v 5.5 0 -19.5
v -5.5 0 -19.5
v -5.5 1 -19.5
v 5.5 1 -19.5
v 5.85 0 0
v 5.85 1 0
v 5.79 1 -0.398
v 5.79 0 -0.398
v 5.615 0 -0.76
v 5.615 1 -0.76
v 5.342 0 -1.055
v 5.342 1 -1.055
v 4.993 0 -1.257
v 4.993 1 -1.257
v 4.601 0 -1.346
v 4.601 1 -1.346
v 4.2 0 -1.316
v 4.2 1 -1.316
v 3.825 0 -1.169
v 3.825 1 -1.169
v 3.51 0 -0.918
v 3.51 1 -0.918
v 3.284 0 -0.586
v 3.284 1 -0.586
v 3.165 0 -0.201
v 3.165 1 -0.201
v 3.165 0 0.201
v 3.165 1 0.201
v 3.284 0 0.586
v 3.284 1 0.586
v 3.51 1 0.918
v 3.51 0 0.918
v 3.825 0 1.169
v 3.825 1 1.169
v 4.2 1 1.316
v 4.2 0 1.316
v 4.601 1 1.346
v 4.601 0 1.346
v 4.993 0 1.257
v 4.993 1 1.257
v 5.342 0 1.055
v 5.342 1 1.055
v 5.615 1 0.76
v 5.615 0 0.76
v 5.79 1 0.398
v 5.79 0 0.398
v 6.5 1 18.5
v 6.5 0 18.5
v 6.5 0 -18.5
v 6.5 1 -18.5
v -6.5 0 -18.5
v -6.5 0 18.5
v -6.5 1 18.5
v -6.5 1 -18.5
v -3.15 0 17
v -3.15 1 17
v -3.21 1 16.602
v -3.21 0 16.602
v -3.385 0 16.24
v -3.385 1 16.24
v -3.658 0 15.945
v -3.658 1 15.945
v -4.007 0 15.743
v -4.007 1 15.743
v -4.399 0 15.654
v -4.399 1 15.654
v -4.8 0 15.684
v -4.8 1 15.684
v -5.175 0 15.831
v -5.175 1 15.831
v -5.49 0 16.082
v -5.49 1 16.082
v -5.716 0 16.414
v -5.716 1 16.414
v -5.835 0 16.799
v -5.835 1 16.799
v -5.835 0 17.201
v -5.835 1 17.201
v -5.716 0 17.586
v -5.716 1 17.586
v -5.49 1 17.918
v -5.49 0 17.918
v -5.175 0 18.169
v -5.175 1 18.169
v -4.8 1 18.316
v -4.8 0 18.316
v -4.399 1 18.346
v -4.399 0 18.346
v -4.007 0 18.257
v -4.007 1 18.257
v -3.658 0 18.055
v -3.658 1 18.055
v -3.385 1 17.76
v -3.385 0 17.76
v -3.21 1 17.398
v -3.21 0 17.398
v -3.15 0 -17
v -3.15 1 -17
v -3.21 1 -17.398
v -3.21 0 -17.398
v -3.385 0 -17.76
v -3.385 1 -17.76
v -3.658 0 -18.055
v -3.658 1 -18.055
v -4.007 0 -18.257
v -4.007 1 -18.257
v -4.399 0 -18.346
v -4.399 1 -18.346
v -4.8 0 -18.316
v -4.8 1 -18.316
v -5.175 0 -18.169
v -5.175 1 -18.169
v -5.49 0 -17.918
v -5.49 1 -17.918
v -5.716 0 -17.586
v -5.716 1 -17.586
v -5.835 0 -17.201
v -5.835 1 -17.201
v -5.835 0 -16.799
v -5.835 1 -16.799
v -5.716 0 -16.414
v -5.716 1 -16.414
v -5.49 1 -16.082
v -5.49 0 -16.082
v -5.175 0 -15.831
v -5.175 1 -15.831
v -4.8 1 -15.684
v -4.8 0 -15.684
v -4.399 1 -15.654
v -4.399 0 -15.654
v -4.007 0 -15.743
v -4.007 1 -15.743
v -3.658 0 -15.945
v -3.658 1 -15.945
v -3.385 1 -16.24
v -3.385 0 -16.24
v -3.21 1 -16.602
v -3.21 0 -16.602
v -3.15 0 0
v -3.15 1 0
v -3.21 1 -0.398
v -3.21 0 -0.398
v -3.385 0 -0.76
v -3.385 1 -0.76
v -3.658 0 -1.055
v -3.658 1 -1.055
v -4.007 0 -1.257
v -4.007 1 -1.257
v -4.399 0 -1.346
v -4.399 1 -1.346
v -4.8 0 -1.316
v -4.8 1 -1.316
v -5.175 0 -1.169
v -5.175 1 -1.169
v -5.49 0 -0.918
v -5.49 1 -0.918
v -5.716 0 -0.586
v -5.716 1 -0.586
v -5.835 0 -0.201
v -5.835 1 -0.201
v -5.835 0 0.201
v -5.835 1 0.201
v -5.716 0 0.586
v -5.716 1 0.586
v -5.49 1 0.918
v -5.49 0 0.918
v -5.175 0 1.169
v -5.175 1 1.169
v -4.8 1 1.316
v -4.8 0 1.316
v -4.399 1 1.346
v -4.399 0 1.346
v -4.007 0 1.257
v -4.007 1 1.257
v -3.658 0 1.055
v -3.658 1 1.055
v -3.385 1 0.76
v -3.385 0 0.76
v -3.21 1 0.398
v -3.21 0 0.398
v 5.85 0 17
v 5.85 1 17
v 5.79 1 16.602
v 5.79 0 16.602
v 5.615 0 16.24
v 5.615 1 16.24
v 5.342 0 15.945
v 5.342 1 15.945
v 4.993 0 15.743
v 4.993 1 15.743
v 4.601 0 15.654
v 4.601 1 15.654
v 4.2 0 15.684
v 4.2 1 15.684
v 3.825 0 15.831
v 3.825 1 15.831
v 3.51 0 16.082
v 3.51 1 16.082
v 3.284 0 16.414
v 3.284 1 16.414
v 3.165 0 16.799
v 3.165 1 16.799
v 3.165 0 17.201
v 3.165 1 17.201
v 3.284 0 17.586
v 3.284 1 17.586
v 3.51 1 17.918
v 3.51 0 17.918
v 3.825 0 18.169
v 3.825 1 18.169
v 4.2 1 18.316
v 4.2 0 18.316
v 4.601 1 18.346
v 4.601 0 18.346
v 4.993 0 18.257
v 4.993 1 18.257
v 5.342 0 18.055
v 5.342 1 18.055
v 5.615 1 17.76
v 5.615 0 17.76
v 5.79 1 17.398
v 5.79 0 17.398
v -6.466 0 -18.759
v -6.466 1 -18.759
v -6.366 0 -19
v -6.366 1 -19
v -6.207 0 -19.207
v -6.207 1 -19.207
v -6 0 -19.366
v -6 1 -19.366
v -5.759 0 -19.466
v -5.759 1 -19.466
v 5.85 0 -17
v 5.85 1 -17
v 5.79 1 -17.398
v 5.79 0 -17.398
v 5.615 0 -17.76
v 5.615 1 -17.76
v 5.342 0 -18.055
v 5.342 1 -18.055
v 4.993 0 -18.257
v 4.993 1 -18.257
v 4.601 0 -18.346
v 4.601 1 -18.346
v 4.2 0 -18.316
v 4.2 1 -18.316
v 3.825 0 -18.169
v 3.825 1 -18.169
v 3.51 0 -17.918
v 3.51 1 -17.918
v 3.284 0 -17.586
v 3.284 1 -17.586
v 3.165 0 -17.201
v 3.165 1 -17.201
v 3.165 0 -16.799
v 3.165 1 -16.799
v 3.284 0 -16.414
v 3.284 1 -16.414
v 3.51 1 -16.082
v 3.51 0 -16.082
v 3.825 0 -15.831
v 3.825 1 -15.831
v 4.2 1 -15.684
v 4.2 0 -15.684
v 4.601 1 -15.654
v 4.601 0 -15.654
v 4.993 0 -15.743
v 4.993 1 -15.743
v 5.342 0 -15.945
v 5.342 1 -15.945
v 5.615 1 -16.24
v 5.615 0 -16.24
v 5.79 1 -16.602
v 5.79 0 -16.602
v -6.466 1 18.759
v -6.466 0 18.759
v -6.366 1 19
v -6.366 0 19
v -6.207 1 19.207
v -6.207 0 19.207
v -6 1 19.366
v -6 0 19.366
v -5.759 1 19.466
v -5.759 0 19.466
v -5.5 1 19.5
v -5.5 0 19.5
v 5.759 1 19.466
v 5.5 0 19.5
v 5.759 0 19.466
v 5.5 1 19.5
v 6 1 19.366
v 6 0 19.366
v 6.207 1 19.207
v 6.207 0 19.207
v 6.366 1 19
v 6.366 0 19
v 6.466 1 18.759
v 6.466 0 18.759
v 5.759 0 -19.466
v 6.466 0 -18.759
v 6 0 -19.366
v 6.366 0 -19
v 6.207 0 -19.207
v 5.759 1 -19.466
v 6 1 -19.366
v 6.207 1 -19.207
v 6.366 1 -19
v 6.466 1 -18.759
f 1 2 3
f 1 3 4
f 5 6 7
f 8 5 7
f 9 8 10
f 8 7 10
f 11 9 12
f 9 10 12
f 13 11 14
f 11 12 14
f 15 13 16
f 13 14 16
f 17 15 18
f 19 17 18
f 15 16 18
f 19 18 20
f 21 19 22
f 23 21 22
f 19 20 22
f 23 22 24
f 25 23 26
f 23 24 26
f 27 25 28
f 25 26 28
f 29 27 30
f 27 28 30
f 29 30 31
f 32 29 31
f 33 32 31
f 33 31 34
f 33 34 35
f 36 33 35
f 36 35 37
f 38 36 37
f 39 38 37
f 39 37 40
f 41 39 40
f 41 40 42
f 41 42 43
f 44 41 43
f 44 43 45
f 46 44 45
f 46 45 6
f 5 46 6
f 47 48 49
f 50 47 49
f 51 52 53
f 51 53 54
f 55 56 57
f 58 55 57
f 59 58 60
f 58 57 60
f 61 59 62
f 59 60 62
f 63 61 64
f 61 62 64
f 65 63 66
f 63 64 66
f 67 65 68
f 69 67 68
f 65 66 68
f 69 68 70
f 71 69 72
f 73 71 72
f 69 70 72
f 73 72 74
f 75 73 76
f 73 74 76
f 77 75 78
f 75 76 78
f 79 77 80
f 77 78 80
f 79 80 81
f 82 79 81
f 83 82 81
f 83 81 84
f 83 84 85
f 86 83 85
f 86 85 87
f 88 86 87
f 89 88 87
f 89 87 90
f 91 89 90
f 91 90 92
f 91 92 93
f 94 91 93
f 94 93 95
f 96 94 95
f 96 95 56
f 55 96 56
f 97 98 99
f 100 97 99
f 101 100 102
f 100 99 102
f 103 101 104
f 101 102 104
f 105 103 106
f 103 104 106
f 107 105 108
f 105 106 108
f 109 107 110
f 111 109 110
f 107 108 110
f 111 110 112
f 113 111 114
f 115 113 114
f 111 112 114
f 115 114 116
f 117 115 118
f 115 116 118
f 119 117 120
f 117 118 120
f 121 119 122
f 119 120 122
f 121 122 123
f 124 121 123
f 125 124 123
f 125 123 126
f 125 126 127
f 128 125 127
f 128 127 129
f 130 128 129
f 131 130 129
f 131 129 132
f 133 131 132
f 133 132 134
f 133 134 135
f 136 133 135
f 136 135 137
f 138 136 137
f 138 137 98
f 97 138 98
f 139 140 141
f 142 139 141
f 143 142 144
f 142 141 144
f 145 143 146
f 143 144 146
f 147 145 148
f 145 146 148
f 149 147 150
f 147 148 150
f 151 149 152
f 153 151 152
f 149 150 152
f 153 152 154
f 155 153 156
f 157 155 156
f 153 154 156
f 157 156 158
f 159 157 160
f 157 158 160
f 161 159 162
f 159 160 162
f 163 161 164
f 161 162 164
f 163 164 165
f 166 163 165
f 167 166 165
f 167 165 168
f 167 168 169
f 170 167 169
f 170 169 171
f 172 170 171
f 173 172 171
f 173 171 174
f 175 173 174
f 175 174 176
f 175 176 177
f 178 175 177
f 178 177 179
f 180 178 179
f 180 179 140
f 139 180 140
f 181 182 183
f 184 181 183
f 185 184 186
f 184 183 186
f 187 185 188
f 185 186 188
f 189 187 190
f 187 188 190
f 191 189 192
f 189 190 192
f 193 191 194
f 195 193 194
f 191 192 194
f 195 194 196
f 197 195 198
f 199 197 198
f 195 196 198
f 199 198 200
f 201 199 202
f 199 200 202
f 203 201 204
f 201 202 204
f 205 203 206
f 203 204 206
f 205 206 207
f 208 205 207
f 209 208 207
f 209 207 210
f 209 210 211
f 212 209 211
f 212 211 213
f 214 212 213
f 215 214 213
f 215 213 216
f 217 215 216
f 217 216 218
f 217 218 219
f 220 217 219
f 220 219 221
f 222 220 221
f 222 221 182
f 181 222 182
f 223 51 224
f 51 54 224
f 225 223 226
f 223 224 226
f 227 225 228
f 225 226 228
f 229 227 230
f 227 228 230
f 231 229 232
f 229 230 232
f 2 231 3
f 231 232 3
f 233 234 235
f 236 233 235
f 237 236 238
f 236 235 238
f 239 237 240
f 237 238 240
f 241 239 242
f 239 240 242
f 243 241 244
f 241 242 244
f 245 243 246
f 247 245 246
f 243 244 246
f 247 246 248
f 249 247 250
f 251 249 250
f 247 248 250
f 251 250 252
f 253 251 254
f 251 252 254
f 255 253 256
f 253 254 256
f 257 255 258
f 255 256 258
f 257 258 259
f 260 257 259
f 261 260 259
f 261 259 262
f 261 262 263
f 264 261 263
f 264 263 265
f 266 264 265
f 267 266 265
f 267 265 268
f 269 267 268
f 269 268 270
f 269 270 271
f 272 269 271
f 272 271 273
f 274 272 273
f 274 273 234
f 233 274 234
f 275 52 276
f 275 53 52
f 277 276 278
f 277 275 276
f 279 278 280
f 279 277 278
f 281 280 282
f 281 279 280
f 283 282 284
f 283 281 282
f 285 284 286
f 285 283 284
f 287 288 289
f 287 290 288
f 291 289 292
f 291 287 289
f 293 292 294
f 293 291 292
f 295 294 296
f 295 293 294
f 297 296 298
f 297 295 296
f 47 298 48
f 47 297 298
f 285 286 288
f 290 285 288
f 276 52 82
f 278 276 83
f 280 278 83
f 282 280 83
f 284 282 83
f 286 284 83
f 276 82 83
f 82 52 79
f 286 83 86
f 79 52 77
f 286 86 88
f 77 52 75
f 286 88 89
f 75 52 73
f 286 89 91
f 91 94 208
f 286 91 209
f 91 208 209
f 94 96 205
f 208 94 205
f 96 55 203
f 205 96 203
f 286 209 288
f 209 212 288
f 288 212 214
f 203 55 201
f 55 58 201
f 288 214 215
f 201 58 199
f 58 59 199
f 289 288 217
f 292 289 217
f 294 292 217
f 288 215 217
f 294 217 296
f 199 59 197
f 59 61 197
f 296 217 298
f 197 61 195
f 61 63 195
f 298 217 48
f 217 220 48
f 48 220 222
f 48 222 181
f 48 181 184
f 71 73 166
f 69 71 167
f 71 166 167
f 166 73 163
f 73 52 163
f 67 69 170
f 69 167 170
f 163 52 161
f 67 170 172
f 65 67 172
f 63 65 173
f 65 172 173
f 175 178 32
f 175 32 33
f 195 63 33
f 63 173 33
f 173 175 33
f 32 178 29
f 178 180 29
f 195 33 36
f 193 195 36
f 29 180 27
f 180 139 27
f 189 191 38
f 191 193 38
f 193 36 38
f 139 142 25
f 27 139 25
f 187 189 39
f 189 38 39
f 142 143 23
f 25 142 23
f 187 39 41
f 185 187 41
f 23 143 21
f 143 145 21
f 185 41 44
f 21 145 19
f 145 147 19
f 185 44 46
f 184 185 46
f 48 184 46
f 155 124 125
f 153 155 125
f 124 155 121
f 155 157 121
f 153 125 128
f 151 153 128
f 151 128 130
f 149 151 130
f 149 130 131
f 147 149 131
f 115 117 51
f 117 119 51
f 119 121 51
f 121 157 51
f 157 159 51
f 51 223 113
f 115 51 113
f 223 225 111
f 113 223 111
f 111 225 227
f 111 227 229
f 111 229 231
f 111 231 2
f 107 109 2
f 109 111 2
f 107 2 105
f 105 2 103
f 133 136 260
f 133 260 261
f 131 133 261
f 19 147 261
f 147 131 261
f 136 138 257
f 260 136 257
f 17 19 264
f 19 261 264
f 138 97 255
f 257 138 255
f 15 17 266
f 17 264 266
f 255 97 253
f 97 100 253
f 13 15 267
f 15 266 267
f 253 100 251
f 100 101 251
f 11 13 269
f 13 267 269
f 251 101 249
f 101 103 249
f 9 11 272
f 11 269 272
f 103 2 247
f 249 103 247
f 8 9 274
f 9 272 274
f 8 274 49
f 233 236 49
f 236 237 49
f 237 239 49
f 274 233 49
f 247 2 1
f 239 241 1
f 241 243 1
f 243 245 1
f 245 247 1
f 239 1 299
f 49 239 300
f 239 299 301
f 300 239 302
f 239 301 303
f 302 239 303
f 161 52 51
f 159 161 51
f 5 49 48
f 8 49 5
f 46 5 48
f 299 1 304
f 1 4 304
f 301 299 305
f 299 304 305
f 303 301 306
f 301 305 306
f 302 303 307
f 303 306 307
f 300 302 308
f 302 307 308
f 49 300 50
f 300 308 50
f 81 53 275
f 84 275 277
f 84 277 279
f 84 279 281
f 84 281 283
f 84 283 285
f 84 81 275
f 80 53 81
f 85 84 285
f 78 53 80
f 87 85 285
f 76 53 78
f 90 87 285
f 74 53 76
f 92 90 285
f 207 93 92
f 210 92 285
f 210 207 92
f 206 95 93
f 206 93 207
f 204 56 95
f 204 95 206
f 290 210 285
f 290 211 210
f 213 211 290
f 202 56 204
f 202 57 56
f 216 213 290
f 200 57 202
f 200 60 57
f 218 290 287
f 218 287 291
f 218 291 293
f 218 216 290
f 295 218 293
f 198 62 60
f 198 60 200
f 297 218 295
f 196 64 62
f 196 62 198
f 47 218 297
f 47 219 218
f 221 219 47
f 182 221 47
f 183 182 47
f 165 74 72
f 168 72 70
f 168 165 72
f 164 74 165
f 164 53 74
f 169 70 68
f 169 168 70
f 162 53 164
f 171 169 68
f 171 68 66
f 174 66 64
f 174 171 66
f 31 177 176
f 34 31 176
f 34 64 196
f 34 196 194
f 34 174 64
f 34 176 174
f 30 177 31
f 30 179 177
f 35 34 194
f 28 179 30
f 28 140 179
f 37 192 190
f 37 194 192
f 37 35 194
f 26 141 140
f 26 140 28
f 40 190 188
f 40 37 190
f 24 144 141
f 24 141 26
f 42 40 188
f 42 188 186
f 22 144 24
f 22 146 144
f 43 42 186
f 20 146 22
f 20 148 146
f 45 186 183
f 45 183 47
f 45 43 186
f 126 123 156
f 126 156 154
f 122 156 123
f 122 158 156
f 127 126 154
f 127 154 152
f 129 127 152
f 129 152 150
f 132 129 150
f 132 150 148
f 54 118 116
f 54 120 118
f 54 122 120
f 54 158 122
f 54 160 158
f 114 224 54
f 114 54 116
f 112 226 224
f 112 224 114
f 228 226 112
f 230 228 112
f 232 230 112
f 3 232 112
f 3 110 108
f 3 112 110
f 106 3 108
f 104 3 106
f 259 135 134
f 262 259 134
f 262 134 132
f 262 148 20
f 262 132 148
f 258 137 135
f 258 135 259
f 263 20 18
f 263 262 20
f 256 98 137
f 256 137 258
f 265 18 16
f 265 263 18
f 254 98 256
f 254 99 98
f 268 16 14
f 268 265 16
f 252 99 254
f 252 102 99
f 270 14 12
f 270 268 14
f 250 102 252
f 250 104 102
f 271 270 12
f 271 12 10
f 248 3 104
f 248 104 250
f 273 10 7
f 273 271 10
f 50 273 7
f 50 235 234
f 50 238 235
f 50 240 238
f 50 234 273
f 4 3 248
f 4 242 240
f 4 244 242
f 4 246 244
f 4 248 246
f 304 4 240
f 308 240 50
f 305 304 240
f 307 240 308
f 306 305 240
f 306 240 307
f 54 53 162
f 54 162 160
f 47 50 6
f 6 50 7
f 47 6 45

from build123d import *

# Parameters (mm, degrees)
SKETCH1_W           = 13
SKETCH1_H           = 39
BOSS_EXTRUDE1_DEPTH = 1
SKETCH2_R           = 1.35
CUT_EXTRUDE1_DEPTH  = 2
FILLET1_R           = 1


with BuildPart() as part:
    # Sketch1 → Boss-Extrude1 (new body)
    with BuildSketch(Plane(origin=(0, 0, 0), x_dir=(1, 0, 0), z_dir=(0, 1, 0))):
        Rectangle(SKETCH1_W, SKETCH1_H)
    extrude(amount=BOSS_EXTRUDE1_DEPTH)

    # Sketch2 → Cut-Extrude1 (cut, through all)
    with BuildSketch(Plane(origin=(0, 1, 0), x_dir=(1, 0, 0), z_dir=(0, 1, 0))):
        with Locations((4.5, 0)):
            Circle(SKETCH2_R)
        with Locations((4.5, -17)):
            Circle(SKETCH2_R)
        with Locations((4.5, 17)):
            Circle(SKETCH2_R)
        with Locations((-4.5, 0)):
            Circle(SKETCH2_R)
        with Locations((-4.5, 17)):
            Circle(SKETCH2_R)
        with Locations((-4.5, -17)):
            Circle(SKETCH2_R)
    extrude(amount=-CUT_EXTRUDE1_DEPTH, mode=Mode.SUBTRACT)

    # Fillet1
    fillet1_edges = [part.edges().sort_by_distance(p)[0] for p in [
        (6.5, 0.5, 19.5),
        (-6.5, 0.5, 19.5),
        (-6.5, 0.5, -19.5),
        (6.5, 0.5, -19.5),
    ]]
    fillet(fillet1_edges, radius=FILLET1_R)


solid = part.part
